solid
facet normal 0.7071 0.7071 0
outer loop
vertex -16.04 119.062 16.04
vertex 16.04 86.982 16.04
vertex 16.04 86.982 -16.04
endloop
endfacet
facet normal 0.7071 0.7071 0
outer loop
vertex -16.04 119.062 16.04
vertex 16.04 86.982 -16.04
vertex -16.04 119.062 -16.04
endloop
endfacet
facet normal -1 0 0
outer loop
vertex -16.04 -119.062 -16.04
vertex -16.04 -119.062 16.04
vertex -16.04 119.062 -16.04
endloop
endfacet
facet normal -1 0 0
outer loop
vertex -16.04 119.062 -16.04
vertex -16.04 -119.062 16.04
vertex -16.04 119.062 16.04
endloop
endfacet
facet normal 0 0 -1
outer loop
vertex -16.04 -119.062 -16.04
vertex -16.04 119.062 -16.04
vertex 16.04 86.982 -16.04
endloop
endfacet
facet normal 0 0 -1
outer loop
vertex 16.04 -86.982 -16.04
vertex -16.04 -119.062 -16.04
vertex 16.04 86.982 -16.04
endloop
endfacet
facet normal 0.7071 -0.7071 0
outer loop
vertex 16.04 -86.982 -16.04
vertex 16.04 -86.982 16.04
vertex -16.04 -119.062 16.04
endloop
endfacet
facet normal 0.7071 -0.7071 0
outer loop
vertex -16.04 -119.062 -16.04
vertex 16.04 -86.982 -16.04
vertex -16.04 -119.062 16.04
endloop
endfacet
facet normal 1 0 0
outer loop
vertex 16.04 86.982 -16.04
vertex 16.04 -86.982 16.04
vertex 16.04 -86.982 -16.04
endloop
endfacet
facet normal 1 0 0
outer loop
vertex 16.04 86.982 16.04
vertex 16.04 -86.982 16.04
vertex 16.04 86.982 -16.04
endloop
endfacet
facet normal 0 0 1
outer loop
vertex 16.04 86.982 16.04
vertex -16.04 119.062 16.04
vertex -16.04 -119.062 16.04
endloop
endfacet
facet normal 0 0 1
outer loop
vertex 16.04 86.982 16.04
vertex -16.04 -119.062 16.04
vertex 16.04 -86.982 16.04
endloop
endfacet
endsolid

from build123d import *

# Parameters (mm, degrees)
F0_W     = 32.0802
F0_H     = 238.125
F1_DEPTH = 16.0401
F3_DEPTH = 32.0802


# Not quite as in the source:
# - a pattern or mirror of a feature is missing from the dataset's text; its kind, count and spacing are read off the source's solid


with BuildPart() as f1:
    # F0 (on Top) → F1 (new body, symmetric)
    with BuildSketch(Plane.XY):
        Rectangle(F0_W, F0_H)
    extrude(amount=F1_DEPTH, both=True)

    # F2 (on face) → F3 (cut, through all)
    with BuildSketch(Plane.XY.offset(16.0401)):
        Polygon((-16.0401, -119.0625), (16.0401, -119.0625), (16.0401, -86.9823), align=None)
    f3 = extrude(amount=-F3_DEPTH, mode=Mode.SUBTRACT)

    # F3_copies: F3 across plane
    add(f3.mirror(Plane.ZX), mode=Mode.SUBTRACT)


solid = f1.part
